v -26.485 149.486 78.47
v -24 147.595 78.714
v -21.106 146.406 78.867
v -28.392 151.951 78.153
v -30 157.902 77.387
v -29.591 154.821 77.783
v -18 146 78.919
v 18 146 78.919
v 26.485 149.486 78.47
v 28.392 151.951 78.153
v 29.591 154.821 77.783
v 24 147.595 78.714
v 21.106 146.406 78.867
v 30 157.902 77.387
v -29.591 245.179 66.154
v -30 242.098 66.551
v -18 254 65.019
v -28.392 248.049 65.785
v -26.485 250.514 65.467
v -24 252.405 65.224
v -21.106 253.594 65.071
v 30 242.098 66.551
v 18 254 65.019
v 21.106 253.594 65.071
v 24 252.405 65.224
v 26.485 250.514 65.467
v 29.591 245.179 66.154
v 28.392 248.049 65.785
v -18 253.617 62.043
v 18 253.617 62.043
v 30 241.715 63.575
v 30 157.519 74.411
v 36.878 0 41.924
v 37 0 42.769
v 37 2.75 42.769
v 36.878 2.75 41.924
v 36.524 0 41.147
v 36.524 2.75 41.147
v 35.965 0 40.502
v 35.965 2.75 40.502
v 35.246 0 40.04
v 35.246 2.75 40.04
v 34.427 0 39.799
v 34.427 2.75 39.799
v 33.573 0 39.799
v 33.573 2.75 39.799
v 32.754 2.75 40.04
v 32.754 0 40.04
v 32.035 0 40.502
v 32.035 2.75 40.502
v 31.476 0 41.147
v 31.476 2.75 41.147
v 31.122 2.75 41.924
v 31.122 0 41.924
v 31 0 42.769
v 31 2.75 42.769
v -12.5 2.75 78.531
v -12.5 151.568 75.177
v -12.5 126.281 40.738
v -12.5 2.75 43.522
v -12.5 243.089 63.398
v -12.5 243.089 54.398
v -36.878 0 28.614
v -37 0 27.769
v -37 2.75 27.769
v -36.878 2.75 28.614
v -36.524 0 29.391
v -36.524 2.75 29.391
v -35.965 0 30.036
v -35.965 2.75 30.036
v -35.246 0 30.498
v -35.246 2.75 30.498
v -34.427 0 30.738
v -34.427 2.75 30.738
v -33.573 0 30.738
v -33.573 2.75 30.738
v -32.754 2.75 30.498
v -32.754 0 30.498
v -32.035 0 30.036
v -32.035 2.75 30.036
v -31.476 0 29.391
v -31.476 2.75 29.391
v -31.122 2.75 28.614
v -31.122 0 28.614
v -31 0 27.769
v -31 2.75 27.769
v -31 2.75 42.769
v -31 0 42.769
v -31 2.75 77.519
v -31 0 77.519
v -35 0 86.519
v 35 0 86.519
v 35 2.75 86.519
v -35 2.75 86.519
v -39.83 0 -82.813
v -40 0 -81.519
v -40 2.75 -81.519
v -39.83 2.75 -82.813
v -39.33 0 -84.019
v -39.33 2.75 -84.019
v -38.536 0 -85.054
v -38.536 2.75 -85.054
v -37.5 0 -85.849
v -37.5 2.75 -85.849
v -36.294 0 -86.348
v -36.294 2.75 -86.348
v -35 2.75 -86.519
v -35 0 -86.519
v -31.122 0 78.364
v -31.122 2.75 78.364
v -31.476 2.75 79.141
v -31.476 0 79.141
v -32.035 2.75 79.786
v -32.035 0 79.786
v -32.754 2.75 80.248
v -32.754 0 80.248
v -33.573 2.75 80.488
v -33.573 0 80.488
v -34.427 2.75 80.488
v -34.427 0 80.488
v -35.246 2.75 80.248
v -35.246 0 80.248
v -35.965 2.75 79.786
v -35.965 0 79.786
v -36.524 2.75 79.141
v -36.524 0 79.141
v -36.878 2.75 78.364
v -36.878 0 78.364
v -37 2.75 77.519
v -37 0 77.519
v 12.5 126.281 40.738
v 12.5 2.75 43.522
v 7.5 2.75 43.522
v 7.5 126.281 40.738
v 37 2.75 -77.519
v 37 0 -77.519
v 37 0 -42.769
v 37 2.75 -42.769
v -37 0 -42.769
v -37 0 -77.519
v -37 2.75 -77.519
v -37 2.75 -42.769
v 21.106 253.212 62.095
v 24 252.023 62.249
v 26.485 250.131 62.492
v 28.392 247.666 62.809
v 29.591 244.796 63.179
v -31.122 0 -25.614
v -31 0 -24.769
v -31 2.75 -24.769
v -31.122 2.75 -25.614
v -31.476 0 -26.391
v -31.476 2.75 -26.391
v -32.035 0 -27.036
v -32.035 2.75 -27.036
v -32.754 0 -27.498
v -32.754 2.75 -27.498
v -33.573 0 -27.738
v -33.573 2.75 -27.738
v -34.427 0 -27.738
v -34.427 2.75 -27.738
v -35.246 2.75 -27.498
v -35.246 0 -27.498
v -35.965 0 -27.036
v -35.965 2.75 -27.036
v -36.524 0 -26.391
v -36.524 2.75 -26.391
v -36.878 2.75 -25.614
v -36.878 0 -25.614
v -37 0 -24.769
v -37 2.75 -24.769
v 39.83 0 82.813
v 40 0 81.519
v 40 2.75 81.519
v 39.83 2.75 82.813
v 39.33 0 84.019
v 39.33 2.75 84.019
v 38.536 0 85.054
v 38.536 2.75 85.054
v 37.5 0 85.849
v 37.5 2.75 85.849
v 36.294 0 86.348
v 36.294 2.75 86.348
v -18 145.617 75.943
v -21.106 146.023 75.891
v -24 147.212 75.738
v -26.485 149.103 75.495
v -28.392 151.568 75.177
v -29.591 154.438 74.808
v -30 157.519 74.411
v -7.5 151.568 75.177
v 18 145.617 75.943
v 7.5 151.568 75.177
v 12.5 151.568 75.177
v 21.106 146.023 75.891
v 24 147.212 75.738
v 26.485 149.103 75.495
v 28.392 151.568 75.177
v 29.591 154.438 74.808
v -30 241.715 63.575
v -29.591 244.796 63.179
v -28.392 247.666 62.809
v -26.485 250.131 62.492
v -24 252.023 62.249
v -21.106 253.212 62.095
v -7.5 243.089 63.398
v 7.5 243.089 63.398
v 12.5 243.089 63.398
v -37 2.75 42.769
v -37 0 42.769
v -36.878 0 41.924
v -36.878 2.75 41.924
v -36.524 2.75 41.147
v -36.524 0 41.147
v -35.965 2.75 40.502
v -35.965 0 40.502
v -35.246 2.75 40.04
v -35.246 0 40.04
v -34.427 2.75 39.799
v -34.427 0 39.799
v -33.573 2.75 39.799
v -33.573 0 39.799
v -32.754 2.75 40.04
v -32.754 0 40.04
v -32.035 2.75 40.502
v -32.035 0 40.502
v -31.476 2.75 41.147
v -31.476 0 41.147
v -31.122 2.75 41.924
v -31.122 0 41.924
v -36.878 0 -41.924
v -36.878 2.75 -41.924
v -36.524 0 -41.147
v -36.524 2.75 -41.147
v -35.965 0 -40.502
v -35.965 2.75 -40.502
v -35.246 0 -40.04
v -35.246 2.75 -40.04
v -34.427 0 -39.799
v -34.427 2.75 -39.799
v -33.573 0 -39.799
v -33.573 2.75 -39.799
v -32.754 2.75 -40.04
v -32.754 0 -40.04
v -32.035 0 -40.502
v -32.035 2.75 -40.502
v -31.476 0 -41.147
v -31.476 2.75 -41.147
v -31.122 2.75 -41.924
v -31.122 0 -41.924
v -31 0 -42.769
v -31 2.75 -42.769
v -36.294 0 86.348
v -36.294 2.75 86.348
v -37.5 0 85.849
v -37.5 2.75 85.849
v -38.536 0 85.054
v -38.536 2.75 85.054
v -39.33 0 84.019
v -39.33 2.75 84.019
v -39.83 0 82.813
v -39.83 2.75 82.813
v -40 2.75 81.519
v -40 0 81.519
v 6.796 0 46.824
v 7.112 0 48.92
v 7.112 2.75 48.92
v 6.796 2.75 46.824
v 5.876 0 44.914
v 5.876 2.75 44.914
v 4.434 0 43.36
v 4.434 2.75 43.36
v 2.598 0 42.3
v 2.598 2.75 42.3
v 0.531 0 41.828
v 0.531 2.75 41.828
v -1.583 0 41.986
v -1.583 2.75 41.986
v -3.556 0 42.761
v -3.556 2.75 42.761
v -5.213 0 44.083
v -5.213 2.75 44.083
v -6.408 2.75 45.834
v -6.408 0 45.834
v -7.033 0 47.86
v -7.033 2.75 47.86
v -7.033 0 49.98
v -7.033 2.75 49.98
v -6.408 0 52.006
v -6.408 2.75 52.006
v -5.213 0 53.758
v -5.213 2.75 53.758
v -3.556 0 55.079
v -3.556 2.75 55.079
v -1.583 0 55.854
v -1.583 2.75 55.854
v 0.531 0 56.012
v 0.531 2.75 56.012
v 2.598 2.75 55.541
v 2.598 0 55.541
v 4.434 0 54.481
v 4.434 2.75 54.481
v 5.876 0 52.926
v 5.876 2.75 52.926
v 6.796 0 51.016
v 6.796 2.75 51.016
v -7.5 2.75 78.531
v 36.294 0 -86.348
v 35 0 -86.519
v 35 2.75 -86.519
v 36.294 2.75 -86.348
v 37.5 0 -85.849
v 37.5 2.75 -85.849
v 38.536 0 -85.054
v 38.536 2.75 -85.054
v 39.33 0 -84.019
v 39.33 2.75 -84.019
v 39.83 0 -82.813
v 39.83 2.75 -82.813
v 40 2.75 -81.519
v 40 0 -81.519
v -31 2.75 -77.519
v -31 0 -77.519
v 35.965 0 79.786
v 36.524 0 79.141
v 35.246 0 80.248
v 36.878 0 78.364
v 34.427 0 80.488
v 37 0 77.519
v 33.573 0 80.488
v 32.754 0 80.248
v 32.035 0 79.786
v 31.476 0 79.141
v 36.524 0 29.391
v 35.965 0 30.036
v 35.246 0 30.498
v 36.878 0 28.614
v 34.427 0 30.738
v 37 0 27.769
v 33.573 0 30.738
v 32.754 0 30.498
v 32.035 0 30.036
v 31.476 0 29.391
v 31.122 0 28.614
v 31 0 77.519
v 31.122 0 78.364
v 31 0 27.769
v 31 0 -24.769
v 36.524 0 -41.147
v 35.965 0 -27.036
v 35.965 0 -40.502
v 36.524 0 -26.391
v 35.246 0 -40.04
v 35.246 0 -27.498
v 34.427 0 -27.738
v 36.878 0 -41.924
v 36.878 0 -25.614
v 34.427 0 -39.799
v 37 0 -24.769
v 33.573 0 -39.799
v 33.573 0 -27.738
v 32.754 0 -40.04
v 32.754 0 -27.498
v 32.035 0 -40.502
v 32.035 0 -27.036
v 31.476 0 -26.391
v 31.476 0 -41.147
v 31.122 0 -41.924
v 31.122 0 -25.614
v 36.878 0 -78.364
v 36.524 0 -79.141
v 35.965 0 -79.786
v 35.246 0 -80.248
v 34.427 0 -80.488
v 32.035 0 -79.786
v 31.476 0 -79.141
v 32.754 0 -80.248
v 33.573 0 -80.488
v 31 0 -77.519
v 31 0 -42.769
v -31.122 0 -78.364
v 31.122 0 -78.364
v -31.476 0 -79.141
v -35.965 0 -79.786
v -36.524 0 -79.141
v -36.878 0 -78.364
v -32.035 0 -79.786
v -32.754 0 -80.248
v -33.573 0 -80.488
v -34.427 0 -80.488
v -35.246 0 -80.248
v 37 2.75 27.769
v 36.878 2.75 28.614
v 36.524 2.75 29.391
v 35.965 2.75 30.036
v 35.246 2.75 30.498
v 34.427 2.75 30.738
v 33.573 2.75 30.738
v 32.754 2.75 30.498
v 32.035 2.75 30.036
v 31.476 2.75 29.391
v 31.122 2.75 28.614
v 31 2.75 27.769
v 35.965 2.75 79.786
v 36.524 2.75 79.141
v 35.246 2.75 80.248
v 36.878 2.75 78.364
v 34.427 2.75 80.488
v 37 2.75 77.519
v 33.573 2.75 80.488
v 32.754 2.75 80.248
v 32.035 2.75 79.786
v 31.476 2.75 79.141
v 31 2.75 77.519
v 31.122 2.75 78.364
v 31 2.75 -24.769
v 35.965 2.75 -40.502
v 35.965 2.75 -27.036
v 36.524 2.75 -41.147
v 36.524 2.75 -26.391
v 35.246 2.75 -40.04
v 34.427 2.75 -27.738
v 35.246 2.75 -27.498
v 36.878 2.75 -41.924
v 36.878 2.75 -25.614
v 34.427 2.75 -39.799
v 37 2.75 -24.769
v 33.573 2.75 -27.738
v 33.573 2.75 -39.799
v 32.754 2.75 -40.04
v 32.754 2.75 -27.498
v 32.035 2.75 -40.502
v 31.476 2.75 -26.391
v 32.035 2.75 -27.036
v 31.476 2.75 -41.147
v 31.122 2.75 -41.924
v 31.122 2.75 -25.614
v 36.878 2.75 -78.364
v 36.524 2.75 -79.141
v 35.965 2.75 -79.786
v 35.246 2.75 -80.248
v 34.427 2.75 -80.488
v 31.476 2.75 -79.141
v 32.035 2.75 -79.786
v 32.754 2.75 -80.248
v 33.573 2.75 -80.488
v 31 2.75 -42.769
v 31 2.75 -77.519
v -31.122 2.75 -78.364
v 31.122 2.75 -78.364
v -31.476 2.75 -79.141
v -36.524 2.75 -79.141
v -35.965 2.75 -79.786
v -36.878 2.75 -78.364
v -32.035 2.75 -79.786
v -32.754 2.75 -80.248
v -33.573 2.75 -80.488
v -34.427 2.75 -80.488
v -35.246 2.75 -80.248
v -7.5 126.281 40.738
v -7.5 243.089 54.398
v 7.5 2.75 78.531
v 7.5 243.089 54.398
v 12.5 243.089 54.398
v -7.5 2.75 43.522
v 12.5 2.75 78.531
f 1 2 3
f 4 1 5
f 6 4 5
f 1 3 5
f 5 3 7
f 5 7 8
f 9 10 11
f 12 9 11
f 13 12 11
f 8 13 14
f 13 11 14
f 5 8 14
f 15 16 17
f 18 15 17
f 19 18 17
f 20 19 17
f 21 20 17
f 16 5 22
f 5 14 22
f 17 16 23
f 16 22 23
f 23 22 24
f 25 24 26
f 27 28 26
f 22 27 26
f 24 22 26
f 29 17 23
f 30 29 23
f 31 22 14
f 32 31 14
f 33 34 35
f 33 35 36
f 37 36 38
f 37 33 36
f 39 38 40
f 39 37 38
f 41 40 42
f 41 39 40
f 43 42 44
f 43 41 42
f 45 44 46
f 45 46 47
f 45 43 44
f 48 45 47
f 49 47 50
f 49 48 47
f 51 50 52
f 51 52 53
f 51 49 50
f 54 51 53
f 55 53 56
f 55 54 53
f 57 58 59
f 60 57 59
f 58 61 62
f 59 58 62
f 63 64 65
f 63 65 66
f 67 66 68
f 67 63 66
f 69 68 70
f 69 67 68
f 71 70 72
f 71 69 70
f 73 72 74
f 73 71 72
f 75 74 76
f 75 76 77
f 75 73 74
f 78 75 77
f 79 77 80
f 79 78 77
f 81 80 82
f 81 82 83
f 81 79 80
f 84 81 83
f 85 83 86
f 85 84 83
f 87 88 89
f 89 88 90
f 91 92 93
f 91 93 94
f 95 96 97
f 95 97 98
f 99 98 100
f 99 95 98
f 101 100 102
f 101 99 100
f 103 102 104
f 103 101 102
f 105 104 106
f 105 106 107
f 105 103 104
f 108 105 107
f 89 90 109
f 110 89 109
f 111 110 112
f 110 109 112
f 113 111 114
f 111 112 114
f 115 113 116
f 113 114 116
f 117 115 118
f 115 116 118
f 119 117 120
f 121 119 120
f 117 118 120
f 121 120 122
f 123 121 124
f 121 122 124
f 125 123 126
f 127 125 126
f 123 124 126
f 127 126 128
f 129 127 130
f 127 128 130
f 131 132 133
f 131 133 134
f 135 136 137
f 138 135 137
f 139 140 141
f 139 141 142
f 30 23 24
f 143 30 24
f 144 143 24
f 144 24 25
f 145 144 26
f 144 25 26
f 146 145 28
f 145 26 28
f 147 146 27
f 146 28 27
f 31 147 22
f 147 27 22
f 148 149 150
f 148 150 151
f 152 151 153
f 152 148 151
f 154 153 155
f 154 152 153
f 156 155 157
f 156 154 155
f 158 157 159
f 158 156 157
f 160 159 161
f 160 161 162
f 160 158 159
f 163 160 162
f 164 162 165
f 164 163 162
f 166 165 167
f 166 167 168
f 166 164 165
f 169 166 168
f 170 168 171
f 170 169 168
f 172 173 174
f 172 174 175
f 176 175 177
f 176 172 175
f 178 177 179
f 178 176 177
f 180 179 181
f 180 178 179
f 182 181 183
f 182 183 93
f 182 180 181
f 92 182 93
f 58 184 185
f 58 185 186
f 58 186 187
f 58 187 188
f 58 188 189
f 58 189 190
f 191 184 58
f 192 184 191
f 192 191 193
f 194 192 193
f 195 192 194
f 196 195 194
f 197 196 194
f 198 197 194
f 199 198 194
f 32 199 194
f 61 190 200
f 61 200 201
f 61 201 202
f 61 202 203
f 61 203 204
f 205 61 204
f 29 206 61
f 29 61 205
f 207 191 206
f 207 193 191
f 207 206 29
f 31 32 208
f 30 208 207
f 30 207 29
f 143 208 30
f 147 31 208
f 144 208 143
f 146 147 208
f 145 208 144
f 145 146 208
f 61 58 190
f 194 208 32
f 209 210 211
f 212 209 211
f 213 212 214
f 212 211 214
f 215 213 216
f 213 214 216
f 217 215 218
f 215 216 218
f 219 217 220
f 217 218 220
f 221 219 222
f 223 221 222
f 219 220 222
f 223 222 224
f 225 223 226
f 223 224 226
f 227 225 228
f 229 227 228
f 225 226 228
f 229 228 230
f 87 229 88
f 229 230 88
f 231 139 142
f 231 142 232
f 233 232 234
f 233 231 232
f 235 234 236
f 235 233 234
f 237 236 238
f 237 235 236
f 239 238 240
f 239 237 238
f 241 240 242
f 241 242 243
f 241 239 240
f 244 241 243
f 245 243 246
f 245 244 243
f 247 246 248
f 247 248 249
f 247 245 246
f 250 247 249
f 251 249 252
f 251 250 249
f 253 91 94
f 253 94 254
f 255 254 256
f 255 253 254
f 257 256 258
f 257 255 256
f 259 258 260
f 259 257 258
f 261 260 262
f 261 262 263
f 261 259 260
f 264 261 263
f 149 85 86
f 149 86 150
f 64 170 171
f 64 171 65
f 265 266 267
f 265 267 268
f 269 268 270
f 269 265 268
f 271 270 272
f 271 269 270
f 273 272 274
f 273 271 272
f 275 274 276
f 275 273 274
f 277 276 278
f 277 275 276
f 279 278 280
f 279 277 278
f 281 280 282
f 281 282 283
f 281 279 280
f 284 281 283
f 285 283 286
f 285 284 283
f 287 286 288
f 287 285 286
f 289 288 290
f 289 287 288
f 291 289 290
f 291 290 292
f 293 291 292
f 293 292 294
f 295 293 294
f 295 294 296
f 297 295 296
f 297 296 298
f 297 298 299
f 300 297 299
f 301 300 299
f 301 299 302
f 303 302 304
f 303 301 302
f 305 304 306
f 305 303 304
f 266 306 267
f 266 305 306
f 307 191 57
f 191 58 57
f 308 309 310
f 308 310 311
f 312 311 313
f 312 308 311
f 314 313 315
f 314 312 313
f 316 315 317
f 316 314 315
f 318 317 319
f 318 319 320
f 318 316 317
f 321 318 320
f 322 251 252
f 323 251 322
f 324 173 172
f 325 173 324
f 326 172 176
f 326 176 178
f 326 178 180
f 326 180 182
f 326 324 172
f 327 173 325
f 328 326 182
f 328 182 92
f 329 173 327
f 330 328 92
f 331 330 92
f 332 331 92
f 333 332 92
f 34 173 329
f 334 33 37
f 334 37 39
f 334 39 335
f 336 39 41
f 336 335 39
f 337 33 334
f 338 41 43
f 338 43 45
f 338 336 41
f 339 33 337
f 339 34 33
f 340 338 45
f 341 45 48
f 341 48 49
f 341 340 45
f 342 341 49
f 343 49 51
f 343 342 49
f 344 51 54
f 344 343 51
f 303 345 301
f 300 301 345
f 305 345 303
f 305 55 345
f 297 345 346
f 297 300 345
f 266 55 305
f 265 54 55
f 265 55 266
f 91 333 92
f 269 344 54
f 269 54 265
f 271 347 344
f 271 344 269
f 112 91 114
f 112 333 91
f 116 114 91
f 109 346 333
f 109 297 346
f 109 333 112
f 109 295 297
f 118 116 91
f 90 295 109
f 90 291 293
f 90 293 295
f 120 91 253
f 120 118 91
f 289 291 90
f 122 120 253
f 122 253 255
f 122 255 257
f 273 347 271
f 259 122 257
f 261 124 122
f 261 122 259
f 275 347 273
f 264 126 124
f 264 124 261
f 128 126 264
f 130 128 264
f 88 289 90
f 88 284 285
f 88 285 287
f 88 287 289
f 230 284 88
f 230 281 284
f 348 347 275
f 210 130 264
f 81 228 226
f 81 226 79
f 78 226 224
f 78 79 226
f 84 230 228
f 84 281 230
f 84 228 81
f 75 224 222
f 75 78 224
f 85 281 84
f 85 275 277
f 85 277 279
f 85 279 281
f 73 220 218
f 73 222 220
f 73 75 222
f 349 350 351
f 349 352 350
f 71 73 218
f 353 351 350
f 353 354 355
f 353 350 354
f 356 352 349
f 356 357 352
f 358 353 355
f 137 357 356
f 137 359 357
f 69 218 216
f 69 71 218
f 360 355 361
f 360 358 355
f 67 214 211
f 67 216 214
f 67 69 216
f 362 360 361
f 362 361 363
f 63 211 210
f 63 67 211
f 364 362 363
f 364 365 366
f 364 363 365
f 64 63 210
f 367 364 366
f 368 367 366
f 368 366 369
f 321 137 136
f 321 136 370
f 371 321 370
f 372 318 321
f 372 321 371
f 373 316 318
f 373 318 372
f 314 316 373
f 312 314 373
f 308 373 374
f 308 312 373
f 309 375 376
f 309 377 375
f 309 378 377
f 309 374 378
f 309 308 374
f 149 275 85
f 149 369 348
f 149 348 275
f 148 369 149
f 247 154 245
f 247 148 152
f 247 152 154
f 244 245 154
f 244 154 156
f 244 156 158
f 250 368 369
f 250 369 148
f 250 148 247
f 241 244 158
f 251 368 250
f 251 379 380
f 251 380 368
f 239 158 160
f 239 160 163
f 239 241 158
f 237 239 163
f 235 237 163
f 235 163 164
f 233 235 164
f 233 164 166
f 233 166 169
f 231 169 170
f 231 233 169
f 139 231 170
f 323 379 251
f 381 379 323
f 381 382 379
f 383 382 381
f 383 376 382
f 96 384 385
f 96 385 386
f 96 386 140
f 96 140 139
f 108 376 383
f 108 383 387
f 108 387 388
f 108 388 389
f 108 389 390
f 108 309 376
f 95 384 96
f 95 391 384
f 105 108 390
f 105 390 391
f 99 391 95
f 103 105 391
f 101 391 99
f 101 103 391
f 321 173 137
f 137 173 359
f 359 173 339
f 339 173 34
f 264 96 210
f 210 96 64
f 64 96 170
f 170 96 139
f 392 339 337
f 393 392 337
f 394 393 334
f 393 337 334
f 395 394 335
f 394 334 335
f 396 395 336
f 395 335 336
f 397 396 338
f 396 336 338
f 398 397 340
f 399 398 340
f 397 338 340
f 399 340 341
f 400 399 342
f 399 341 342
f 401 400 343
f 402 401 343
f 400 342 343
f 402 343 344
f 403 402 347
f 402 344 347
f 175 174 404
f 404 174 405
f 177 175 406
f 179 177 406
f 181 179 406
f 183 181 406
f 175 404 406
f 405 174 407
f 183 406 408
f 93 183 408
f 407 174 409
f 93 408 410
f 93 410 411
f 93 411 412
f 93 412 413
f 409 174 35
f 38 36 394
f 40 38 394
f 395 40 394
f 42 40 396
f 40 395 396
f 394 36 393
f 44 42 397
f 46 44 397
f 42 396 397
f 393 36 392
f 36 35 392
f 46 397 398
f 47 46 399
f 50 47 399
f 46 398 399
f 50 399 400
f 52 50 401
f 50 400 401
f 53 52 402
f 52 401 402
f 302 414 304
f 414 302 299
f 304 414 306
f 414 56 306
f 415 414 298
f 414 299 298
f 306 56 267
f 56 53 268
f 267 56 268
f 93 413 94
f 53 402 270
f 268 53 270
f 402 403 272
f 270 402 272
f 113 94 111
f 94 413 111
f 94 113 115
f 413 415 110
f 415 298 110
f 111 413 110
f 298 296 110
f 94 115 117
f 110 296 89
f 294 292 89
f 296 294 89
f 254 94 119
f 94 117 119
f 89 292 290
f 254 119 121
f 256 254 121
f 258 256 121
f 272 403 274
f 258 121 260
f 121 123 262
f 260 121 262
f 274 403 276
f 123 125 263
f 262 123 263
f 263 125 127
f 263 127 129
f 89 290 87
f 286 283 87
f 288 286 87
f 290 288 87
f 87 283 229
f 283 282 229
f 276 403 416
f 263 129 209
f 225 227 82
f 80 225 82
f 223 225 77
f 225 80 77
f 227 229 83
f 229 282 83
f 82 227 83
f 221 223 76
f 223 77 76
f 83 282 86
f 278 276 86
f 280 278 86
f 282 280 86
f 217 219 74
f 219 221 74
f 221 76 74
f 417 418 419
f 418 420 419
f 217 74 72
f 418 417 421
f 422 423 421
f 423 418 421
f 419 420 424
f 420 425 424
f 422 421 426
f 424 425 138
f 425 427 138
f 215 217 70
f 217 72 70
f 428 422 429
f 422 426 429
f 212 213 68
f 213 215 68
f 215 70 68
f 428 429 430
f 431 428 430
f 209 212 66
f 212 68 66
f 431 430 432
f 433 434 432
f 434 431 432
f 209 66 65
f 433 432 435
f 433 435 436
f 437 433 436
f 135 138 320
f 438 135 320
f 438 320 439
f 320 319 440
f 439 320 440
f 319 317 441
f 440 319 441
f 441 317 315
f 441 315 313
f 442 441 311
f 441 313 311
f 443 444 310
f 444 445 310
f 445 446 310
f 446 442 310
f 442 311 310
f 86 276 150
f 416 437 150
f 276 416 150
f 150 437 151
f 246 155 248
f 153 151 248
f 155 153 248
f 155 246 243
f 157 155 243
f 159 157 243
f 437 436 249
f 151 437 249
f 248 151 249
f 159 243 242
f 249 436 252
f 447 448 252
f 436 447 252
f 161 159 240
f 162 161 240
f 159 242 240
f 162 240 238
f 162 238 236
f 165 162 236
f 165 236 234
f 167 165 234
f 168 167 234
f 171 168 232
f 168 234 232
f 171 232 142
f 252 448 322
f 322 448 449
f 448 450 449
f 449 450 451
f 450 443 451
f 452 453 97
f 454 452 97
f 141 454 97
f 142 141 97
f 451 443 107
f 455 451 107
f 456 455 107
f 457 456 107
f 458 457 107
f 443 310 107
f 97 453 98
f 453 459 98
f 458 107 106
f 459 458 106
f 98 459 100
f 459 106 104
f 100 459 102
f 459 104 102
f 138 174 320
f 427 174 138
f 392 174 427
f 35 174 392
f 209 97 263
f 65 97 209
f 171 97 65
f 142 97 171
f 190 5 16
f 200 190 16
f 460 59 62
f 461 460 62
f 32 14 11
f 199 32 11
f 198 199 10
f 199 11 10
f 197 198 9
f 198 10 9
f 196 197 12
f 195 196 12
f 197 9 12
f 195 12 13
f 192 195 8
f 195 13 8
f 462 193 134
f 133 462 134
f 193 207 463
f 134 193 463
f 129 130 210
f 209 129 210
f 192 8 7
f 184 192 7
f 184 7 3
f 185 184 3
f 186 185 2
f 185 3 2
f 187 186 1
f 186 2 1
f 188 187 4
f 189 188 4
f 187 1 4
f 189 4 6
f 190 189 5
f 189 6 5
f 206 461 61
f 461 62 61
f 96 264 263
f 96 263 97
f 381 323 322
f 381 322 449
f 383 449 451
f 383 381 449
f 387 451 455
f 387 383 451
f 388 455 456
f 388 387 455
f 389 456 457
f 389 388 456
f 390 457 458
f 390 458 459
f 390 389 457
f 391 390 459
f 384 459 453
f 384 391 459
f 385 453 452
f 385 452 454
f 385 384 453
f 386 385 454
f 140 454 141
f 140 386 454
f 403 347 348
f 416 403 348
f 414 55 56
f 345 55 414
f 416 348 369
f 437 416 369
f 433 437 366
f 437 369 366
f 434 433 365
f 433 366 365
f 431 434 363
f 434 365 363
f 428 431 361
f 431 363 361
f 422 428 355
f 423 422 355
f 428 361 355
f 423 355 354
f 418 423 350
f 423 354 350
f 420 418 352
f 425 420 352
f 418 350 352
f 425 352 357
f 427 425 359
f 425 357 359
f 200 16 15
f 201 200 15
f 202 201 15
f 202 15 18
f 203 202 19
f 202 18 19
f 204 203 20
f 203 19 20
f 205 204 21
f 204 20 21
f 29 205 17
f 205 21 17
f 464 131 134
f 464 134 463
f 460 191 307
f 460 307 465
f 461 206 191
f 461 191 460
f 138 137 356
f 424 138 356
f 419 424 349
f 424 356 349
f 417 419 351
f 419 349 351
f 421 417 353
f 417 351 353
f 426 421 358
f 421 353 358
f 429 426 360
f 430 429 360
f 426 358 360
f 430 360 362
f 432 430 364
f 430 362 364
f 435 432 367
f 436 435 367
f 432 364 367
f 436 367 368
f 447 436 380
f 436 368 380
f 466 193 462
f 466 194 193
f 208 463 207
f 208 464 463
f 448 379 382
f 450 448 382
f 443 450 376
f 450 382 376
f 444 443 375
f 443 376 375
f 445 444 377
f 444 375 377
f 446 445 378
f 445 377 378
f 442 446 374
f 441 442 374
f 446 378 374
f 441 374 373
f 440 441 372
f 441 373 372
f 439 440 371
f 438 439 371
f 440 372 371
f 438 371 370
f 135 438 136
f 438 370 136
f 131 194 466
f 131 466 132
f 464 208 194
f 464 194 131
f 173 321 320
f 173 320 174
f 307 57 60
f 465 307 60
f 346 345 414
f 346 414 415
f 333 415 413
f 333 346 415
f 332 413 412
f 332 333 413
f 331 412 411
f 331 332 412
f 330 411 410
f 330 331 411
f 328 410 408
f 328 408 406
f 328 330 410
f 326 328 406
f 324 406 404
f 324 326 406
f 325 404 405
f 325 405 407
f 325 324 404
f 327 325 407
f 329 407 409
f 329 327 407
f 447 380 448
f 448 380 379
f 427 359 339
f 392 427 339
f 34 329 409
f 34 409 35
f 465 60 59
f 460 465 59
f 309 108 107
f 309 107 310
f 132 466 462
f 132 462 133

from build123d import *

# Parameters (mm, degrees)
SKETCH1_R           = 7.112045721
BOSS_EXTRUDE1_DEPTH = 2.75
BOSS_EXTRUDE2_DEPTH = 3
BOSS_EXTRUDE3_DEPTH = 2.5


with BuildPart() as part:
    # Sketch1 → Boss-Extrude1 (new body)
    with BuildSketch(Plane(origin=(0, 0, 0), x_dir=(1, 0, 0), z_dir=(0, 1, 0))):
        with BuildLine():
            Line((-35, 86.51875), (35, 86.51875))
            ThreePointArc((35, 86.51875), (38.535533906, 85.054283906), (40, 81.51875))
            Line((40, 81.51875), (40, -81.51875))
            ThreePointArc((40, -81.51875), (38.535533906, -85.054283906), (35, -86.51875))
            Line((35, -86.51875), (-35, -86.51875))
            ThreePointArc((-35, -86.51875), (-38.535533906, -85.054283906), (-40, -81.51875))
            Line((-40, -81.51875), (-40, 81.51875))
            ThreePointArc((-40, 81.51875), (-38.535533906, 85.054283906), (-35, 86.51875))
        make_face()
        with Locations((0, -48.920084539)):
            Circle(SKETCH1_R, mode=Mode.SUBTRACT)
        with BuildLine():
            Line((37, 77.51875), (37, 42.76875))
            ThreePointArc((37, 42.76875), (34, 39.76875), (31, 42.76875))
            Line((31, 42.76875), (31, 77.51875))
            ThreePointArc((31, 77.51875), (34, 80.51875), (37, 77.51875))
        make_face(mode=Mode.SUBTRACT)
        with BuildLine():
            Line((-37, 77.51875), (-37, 42.76875))
            ThreePointArc((-37, 42.76875), (-34, 39.76875), (-31, 42.76875))
            Line((-31, 42.76875), (-31, 77.51875))
            ThreePointArc((-31, 77.51875), (-34, 80.51875), (-37, 77.51875))
        make_face(mode=Mode.SUBTRACT)
        with BuildLine():
            Line((37, -77.51875), (37, -42.76875))
            ThreePointArc((37, -42.76875), (34, -39.76875), (31, -42.76875))
            Line((31, -42.76875), (31, -77.51875))
            ThreePointArc((31, -77.51875), (34, -80.51875), (37, -77.51875))
        make_face(mode=Mode.SUBTRACT)
        with BuildLine():
            Line((-37, -77.51875), (-37, -42.76875))
            ThreePointArc((-37, -42.76875), (-34, -39.76875), (-31, -42.76875))
            Line((-31, -42.76875), (-31, -77.51875))
            ThreePointArc((-31, -77.51875), (-34, -80.51875), (-37, -77.51875))
        make_face(mode=Mode.SUBTRACT)
        with BuildLine():
            Line((37, 24.76875), (37, -27.76875))
            ThreePointArc((37, -27.76875), (34, -30.76875), (31, -27.76875))
            Line((31, -27.76875), (31, 24.76875))
            ThreePointArc((31, 24.76875), (34, 27.76875), (37, 24.76875))
        make_face(mode=Mode.SUBTRACT)
        with BuildLine():
            Line((-37, 24.76875), (-37, -27.76875))
            ThreePointArc((-37, -27.76875), (-34, -30.76875), (-31, -27.76875))
            Line((-31, -27.76875), (-31, 24.76875))
            ThreePointArc((-31, 24.76875), (-34, 27.76875), (-37, 24.76875))
        make_face(mode=Mode.SUBTRACT)
    extrude(amount=BOSS_EXTRUDE1_DEPTH)


with BuildPart() as body_2:
    # Sketch3 → Boss-Extrude2 (new body)
    with BuildSketch(Plane(origin=(0, 12.370657811, 96.117341263), x_dir=(0, -0.991819174, 0.127650801), z_dir=(0, 0.127650801, 0.991819174))):
        with BuildLine():
            Line((-231.622374558, 30), (-146.731557682, 30))
            ThreePointArc((-146.731557682, 30), (-138.246276308, 26.485281374), (-134.731557682, 18))
            Line((-134.731557682, 18), (-134.731557682, -18))
            ThreePointArc((-134.731557682, -18), (-138.246276308, -26.485281374), (-146.731557682, -30))
            Line((-146.731557682, -30), (-231.622374558, -30))
            ThreePointArc((-231.622374558, -30), (-240.107655932, -26.485281374), (-243.622374558, -18))
            Line((-243.622374558, -18), (-243.622374558, 18))
            ThreePointArc((-243.622374558, 18), (-240.107655932, 26.485281374), (-231.622374558, 30))
        make_face()
    extrude(amount=-BOSS_EXTRUDE2_DEPTH)

    # Sketch4 → Boss-Extrude3 (add, symmetric)
    with BuildSketch(Plane(origin=(10, 0, 0), x_dir=(0, 0, -1), z_dir=(1, 0, 0))):
        Polygon((-75.177387673, 151.567962638), (-78.530764988, 2.75), (-43.521880404, 2.75), (-40.738309922, 126.280771894), (-54.39829674, 243.088956939), (-63.39829674, 243.088956939), align=None)
    boss_extrude3 = extrude(amount=BOSS_EXTRUDE3_DEPTH, both=True)

    # Mirror2: Boss-Extrude3 across plane
    add(boss_extrude3.mirror(Plane(origin=(0, 0, 0), x_dir=(0, 0, 1), z_dir=(1, 0, 0))))


solid = Compound([part.part, body_2.part])
